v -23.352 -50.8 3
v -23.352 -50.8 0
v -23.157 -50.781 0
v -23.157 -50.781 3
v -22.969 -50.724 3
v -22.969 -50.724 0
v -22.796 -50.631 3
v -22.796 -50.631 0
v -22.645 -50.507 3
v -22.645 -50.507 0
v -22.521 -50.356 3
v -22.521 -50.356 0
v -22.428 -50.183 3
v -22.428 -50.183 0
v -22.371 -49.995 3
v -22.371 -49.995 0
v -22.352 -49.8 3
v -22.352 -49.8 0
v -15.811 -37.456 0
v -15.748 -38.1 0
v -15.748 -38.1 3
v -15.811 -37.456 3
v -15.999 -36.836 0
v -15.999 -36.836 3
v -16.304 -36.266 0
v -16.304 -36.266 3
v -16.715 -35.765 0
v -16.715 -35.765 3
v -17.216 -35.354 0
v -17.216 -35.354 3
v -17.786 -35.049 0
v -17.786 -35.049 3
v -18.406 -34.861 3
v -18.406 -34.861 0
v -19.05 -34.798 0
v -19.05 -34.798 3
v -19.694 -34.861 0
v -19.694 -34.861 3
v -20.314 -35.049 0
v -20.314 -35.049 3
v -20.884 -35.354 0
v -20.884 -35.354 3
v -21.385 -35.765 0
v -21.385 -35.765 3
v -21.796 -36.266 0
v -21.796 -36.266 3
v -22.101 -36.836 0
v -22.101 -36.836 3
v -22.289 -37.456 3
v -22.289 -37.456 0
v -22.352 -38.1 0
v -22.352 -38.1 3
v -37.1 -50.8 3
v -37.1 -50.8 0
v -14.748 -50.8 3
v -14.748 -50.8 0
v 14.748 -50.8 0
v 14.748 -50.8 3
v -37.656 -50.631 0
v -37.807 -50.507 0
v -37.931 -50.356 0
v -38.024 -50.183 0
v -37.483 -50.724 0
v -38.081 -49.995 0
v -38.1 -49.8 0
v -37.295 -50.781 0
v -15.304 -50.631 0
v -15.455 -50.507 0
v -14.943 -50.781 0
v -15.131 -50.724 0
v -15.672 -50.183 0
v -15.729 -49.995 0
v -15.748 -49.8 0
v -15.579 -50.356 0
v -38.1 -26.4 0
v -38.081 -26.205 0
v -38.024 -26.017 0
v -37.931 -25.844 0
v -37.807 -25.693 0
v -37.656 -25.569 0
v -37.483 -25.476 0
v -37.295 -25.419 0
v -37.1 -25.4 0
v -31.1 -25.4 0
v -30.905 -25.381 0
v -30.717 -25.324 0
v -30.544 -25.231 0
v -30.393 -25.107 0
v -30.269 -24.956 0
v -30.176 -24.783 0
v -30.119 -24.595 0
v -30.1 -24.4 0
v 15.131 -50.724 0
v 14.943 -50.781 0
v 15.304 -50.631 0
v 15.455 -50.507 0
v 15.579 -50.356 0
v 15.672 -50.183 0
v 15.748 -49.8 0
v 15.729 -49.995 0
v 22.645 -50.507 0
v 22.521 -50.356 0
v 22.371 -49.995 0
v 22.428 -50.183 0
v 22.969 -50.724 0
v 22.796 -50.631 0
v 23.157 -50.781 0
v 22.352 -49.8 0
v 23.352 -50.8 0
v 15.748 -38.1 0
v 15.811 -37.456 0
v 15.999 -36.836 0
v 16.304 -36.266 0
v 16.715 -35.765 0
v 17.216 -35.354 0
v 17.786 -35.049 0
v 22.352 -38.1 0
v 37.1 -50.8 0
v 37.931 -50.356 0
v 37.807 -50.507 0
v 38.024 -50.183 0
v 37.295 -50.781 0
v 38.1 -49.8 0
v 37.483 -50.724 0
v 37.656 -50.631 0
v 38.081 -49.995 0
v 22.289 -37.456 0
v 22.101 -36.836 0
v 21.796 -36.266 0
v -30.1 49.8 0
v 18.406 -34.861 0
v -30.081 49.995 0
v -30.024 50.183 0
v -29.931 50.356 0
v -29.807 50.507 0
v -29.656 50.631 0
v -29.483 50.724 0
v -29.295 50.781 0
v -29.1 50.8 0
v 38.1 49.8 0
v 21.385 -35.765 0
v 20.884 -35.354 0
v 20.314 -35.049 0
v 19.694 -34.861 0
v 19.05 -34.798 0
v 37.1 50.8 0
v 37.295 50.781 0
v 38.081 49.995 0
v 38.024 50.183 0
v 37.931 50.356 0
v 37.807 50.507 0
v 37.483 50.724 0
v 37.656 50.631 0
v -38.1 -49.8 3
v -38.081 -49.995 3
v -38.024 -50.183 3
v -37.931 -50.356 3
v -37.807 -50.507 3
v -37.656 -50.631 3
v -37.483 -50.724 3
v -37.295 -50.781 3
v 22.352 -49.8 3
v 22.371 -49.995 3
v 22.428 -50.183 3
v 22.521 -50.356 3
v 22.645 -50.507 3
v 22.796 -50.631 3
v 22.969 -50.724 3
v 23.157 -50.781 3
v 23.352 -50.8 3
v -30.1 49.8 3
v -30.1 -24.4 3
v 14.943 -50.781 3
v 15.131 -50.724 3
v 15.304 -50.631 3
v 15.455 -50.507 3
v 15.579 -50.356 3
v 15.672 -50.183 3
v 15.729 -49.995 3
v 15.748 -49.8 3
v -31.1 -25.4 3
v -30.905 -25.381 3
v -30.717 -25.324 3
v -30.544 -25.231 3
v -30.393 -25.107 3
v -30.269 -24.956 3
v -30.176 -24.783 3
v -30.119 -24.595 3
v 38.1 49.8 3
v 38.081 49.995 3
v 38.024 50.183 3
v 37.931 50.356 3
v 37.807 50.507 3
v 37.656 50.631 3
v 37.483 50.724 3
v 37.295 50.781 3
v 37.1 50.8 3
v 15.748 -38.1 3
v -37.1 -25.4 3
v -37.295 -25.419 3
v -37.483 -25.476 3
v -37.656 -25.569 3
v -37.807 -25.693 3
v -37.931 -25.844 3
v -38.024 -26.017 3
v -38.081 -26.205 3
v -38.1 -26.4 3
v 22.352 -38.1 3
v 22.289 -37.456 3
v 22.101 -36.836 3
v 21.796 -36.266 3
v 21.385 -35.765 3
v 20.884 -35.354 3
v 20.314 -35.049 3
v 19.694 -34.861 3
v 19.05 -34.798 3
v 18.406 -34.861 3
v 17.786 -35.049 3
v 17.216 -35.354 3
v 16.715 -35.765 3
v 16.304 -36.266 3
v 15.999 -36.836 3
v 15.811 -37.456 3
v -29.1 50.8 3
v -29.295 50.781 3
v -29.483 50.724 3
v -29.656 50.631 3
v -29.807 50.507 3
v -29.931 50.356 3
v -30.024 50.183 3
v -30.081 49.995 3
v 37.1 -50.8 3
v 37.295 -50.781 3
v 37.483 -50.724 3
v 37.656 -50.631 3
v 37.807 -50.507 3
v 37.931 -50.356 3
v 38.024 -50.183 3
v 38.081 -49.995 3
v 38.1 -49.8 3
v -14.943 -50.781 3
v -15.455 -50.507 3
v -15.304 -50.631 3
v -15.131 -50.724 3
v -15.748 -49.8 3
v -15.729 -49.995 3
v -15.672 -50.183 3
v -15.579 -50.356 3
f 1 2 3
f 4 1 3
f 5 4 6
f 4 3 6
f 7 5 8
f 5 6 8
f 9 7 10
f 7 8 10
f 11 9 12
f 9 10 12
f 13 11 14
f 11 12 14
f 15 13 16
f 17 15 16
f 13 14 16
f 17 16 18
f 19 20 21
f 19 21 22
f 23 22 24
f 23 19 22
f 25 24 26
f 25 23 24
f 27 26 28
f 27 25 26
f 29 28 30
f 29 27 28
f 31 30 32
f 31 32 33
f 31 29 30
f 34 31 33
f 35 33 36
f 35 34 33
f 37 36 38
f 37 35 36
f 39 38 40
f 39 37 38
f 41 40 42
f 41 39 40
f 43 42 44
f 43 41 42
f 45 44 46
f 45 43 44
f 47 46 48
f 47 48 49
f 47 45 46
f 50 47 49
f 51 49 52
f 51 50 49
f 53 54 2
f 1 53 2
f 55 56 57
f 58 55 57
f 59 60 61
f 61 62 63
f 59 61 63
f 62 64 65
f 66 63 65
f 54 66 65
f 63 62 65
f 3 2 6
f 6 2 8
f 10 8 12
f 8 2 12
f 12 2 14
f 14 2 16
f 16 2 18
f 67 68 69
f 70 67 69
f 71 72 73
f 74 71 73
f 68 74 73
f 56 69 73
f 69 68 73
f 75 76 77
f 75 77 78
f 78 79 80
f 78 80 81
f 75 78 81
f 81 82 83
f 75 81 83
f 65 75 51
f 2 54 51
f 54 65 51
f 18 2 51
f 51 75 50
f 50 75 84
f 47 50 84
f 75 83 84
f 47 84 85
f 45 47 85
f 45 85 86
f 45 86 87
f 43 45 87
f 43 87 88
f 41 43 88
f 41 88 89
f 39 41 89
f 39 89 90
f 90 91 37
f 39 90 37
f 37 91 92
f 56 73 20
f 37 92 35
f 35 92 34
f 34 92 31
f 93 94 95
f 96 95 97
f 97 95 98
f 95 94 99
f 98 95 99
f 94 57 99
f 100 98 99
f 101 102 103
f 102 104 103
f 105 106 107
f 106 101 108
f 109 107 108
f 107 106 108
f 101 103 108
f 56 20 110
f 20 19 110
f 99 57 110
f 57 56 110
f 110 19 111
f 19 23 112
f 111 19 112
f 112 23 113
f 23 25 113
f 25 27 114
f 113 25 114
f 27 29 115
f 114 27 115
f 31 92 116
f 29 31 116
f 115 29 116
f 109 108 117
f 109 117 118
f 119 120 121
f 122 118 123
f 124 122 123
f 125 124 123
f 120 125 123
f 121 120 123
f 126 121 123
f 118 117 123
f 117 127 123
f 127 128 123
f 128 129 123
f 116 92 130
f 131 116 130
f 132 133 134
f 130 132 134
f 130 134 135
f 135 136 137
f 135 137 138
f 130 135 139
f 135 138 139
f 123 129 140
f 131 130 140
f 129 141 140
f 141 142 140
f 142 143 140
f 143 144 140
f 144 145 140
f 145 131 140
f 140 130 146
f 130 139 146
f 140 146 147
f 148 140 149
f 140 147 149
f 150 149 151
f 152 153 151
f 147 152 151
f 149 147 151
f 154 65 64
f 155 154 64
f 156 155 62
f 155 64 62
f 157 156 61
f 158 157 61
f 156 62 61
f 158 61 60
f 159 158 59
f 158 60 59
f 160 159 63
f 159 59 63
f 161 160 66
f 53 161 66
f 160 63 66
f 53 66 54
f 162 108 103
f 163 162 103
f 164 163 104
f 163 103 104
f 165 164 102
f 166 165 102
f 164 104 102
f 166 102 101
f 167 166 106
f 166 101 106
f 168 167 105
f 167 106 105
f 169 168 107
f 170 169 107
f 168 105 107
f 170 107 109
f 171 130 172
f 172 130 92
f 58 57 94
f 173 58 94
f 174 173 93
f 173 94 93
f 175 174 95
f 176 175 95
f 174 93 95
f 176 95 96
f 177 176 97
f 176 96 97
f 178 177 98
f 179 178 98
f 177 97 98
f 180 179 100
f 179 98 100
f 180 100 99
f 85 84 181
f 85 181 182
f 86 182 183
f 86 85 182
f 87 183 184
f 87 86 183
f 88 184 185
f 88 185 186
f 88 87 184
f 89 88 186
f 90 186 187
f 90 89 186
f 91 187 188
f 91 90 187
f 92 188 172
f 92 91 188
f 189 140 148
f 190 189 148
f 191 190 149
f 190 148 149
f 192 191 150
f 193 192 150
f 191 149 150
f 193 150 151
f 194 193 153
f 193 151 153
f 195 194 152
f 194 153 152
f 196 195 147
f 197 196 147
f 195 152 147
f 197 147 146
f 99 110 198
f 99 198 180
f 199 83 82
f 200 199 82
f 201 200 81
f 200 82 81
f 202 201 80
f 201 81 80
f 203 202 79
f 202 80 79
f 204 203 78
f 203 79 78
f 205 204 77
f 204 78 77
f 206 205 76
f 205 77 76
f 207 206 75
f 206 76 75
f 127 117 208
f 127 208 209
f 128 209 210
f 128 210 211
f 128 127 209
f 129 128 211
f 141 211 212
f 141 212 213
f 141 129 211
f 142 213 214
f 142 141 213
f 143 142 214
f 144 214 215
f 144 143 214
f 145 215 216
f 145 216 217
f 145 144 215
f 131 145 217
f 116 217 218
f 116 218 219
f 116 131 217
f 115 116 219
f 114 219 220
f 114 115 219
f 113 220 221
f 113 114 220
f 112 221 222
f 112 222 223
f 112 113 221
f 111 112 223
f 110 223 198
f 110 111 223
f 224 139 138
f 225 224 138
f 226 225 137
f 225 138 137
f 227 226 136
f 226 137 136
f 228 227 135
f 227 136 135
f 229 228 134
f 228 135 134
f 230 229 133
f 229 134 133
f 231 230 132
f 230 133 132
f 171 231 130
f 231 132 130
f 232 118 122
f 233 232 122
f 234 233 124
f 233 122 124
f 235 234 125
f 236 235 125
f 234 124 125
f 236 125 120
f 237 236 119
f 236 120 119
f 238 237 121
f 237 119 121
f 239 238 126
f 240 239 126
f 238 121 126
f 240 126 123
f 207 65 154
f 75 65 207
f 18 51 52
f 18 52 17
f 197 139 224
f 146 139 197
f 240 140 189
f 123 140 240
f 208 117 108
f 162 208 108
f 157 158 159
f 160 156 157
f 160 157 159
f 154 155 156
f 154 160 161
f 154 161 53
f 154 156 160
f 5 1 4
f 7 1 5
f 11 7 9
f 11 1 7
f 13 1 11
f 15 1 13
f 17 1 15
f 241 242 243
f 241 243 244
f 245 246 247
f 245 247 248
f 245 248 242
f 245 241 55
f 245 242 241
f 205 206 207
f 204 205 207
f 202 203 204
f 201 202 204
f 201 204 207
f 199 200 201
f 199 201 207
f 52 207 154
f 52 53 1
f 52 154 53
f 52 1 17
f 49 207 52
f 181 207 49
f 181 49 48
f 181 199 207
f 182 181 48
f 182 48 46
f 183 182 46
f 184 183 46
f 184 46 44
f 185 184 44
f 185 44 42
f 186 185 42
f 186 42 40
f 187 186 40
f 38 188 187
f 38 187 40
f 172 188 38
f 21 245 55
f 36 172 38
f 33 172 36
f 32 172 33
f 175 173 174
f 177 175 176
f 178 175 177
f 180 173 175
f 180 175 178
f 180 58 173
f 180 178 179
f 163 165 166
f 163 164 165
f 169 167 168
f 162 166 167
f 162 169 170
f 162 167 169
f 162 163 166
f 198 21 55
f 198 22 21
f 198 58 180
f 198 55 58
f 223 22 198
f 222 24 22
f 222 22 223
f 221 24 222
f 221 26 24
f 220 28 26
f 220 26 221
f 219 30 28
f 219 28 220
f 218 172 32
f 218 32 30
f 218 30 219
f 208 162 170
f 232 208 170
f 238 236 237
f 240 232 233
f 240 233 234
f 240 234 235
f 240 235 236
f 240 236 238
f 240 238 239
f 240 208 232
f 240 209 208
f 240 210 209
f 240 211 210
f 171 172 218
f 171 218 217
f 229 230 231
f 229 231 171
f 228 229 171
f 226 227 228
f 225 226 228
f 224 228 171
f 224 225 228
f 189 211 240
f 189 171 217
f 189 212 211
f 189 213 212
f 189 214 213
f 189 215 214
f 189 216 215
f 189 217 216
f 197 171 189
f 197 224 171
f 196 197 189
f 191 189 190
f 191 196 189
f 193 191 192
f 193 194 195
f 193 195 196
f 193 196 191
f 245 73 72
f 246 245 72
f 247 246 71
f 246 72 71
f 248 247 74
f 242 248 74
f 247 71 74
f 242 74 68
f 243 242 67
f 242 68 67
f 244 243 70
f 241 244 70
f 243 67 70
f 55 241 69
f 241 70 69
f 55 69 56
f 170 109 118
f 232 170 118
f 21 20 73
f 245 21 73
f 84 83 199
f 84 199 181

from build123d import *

# Parameters (mm, degrees)
PAD_DEPTH = 3


with BuildPart() as part:
    # Sketch → Pad (new body)
    with BuildSketch(Plane.XY):
        with BuildLine():
            ThreePointArc((-29.1, 50.8), (-29.807107, 50.507107), (-30.1, 49.8))
            Line((-30.1, 49.8), (-30.1, -24.4))
            ThreePointArc((-31.1, -25.4), (-30.392893, -25.107107), (-30.1, -24.4))
            Line((-37.1, -25.4), (-31.1, -25.4))
            ThreePointArc((-37.1, -25.4), (-37.807107, -25.692893), (-38.1, -26.4))
            Line((-38.1, -49.8), (-38.1, -26.4))
            ThreePointArc((-38.1, -49.8), (-37.807107, -50.507107), (-37.1, -50.8))
            Line((-37.1, -50.8), (-23.352, -50.8))
            ThreePointArc((-23.352, -50.8), (-22.644893, -50.507107), (-22.352, -49.8))
            Line((-22.352, -38.1), (-22.352, -49.8))
            ThreePointArc((-15.748, -38.1), (-19.05, -34.798), (-22.352, -38.1))
            Line((-15.748, -38.1), (-15.748, -49.8))
            ThreePointArc((-15.748, -49.8), (-15.455107, -50.507107), (-14.748, -50.8))
            Line((-14.748, -50.8), (14.748, -50.8))
            ThreePointArc((14.748, -50.8), (15.455107, -50.507107), (15.748, -49.8))
            Line((15.748, -38.1), (15.748, -49.8))
            ThreePointArc((22.352, -38.1), (19.05, -34.798), (15.748, -38.1))
            Line((22.352, -38.1), (22.352, -49.8))
            ThreePointArc((22.352, -49.8), (22.644893, -50.507107), (23.352, -50.8))
            Line((23.352, -50.8), (37.1, -50.8))
            ThreePointArc((37.1, -50.8), (37.807107, -50.507107), (38.1, -49.8))
            Line((38.1, 49.8), (38.1, -49.8))
            ThreePointArc((38.1, 49.8), (37.807107, 50.507107), (37.1, 50.8))
            Line((-29.1, 50.8), (37.1, 50.8))
        make_face()
    extrude(amount=PAD_DEPTH)


solid = part.part
